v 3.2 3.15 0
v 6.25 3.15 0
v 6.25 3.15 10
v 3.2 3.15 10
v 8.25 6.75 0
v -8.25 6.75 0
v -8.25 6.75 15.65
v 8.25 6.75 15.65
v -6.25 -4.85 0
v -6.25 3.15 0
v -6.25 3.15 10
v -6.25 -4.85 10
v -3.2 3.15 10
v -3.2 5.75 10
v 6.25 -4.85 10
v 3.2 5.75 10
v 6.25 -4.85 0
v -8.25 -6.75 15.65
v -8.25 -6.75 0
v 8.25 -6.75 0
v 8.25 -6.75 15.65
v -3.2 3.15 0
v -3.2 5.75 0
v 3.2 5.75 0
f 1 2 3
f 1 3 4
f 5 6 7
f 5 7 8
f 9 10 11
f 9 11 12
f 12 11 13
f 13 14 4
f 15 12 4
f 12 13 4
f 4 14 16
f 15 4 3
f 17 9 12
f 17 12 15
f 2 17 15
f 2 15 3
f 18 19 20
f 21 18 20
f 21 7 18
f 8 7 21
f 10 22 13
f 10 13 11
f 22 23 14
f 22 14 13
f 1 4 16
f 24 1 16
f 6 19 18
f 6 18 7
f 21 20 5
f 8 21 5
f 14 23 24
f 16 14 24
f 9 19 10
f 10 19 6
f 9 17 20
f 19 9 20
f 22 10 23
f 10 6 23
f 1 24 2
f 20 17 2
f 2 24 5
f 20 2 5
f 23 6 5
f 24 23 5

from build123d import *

# Parameters (mm, degrees)
SKETCH1_W           = 16.5
SKETCH1_H           = 13.5
BOSS_EXTRUDE1_DEPTH = 15.65
SKETCH2_W           = 6.4
SKETCH2_H           = 5.096586226
SKETCH2_H_2         = 1.7
SKETCH2_H_3         = 0.9
CUT_EXTRUDE1_DEPTH  = 10


with BuildPart() as part:
    # Sketch1 → Boss-Extrude1 (new body)
    with BuildSketch(Plane.XY):
        Rectangle(SKETCH1_W, SKETCH1_H)
    extrude(amount=BOSS_EXTRUDE1_DEPTH)

    # Sketch2 → Cut-Extrude1 (cut)
    with BuildSketch(Plane.XY):
        Polygon((6.25, -4.85), (6.25, 3.15), (3.2, 3.15), (3.2, -1.946586226), (-3.2, -1.946586226), (-3.2, 3.15), (-6.25, 3.15), (-6.25, -4.85), align=None)
        with Locations((0, 0.601706887)):
            Rectangle(SKETCH2_W, SKETCH2_H)
        with Locations((0, 4)):
            Rectangle(SKETCH2_W, SKETCH2_H_2)
        with Locations((0, 5.3)):
            Rectangle(SKETCH2_W, SKETCH2_H_3)
    extrude(amount=CUT_EXTRUDE1_DEPTH, mode=Mode.SUBTRACT)


solid = part.part
